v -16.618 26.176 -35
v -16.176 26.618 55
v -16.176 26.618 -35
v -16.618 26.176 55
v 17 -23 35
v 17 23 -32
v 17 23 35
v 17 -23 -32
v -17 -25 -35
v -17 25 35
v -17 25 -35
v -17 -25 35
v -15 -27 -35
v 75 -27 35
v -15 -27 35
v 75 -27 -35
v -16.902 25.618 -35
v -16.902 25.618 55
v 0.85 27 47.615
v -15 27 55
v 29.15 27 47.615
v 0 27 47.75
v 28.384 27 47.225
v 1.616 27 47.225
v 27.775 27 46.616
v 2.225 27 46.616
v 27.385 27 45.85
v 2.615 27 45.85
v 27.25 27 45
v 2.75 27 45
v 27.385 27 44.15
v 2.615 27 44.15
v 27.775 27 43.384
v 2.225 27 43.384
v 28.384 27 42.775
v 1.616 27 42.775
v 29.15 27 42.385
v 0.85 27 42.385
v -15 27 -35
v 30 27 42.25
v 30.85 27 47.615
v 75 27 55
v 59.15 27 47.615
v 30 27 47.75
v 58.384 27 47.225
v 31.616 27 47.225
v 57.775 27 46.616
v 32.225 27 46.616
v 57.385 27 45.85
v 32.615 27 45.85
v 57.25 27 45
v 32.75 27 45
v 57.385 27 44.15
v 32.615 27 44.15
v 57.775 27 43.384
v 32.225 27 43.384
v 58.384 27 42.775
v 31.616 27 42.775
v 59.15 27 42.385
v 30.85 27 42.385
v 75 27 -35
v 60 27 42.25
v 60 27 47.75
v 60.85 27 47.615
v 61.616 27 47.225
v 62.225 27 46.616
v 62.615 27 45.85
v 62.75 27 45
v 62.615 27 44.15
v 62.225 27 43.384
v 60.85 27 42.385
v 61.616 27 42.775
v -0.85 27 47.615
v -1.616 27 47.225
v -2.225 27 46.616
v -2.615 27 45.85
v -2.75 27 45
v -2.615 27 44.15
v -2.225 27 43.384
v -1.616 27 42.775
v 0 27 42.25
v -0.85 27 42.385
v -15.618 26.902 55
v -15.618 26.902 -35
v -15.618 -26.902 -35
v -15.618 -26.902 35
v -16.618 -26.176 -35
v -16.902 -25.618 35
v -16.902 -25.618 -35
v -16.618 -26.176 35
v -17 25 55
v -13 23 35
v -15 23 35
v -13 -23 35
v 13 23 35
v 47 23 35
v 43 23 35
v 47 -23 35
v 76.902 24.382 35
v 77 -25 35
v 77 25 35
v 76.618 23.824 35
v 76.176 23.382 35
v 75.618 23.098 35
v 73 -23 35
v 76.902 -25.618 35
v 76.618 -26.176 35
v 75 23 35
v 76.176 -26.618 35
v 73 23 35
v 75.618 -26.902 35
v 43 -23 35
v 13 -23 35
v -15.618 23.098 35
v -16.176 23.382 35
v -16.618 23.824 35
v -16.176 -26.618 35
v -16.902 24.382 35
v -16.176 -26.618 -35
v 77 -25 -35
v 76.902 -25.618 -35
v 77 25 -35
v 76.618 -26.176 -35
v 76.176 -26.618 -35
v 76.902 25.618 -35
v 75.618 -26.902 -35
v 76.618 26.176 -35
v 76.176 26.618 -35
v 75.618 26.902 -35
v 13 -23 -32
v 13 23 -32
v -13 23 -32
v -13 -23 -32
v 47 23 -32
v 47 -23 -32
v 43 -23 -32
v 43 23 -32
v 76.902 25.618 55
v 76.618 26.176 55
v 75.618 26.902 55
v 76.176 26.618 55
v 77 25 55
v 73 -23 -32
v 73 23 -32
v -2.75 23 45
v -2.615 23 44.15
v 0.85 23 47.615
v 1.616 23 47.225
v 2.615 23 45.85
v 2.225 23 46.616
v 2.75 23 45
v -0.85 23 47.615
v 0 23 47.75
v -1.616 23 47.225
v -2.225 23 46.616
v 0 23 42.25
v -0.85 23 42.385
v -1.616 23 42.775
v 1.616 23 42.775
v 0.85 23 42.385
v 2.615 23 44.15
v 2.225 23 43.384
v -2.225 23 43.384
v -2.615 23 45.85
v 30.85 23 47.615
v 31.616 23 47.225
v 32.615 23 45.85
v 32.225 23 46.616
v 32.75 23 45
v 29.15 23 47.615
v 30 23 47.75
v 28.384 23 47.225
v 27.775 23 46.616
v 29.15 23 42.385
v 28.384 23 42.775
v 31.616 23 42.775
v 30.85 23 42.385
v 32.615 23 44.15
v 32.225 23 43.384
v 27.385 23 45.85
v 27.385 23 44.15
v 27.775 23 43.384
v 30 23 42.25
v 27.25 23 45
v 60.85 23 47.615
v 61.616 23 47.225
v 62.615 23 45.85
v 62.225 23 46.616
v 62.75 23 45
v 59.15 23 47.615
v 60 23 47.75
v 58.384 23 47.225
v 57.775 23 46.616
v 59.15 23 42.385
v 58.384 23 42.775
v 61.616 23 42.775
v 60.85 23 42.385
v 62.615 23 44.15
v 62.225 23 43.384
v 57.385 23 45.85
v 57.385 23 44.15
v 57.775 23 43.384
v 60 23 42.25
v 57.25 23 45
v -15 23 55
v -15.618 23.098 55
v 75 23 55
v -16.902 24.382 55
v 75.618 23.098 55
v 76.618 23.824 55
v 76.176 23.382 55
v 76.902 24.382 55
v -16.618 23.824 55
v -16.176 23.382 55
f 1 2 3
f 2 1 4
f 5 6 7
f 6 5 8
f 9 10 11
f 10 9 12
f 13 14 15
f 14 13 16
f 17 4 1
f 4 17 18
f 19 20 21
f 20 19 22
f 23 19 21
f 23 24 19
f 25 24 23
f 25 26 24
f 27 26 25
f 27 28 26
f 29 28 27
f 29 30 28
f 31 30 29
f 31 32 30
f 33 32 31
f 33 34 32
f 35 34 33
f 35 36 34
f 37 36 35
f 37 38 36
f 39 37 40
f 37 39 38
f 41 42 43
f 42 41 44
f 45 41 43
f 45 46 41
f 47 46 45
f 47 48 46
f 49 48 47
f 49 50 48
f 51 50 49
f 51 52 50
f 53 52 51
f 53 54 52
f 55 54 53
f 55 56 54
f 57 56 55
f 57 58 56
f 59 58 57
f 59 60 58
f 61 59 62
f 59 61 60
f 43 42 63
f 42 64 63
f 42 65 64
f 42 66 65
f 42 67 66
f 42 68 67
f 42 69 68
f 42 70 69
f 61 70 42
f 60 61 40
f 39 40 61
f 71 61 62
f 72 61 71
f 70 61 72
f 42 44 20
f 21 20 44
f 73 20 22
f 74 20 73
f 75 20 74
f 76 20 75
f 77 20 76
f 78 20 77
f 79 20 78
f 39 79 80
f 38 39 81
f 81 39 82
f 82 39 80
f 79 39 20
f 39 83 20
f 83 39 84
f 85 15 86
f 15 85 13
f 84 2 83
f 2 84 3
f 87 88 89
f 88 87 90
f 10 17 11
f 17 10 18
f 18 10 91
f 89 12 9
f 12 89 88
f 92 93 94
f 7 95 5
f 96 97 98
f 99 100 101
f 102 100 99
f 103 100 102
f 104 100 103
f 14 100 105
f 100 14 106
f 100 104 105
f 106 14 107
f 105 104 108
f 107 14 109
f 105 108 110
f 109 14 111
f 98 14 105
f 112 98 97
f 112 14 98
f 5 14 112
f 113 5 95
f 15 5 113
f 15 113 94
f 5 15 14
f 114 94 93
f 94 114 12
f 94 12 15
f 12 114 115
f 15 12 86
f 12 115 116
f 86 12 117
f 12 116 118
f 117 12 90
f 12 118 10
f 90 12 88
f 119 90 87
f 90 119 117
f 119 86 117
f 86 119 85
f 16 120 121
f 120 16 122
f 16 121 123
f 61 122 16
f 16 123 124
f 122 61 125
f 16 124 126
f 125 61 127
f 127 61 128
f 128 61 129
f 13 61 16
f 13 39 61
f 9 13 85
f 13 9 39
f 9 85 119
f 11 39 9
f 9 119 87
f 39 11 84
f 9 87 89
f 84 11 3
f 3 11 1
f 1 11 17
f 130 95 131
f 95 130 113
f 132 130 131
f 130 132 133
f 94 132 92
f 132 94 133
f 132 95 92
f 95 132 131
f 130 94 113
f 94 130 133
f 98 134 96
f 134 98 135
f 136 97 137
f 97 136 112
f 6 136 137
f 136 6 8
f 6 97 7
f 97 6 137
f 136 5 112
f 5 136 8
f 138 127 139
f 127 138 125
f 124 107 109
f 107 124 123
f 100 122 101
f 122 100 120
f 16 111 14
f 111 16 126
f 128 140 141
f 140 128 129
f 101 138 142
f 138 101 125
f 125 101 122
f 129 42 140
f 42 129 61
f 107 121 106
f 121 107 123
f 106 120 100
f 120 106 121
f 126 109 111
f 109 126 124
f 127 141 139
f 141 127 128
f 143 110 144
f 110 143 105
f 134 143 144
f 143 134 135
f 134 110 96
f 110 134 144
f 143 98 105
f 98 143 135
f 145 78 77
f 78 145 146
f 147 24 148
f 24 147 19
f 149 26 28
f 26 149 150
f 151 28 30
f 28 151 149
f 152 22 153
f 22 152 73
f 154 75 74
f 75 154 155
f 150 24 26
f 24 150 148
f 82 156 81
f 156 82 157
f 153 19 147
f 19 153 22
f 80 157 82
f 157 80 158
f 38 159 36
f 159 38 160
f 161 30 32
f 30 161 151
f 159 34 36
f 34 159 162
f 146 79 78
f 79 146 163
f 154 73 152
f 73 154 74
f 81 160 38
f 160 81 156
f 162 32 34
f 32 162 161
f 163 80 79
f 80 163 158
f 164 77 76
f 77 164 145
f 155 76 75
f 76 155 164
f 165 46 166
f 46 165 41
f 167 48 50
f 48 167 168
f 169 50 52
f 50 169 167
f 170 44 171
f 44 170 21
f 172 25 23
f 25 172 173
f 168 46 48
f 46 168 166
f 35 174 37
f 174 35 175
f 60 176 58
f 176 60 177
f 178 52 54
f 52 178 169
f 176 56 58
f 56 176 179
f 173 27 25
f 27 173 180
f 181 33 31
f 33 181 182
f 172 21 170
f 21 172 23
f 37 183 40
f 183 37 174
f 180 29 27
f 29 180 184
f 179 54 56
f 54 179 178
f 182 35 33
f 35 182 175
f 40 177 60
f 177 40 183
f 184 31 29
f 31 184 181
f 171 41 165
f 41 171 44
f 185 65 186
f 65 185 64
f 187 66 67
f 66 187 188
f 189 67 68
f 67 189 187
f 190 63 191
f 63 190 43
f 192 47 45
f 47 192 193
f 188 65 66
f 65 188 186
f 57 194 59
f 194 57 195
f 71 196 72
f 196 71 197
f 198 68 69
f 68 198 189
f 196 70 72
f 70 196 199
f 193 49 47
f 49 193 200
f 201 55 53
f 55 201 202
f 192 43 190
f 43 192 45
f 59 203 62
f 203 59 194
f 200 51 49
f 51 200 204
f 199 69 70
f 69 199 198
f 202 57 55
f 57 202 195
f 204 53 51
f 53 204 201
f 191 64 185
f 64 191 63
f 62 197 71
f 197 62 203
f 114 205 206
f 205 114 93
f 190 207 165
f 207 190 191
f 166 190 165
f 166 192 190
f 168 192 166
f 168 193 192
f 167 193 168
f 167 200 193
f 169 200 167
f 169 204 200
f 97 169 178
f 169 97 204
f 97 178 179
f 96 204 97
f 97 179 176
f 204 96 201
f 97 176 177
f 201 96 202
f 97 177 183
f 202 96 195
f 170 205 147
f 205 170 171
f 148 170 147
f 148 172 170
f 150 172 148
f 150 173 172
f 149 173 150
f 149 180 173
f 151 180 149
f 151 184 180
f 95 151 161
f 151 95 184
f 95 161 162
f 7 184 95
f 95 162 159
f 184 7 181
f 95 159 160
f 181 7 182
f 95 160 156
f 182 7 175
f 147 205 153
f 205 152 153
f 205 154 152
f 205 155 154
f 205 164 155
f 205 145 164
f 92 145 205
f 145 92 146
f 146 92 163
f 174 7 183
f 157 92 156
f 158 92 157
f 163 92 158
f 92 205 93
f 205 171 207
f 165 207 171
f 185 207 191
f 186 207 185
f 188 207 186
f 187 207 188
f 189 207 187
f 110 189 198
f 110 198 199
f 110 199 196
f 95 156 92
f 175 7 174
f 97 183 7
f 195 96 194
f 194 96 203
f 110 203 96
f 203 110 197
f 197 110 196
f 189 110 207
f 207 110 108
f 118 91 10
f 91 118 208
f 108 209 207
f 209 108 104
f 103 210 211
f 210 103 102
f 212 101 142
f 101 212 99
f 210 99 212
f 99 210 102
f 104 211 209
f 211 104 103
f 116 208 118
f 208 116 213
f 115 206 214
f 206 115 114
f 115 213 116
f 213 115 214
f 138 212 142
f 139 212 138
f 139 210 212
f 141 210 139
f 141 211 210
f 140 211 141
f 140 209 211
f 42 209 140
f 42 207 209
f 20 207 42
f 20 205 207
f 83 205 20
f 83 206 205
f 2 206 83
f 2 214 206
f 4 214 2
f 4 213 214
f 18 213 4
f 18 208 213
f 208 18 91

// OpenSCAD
/***********************************************************************
Name ......... : parametricHangingStorageBox.scad
Description....: Parametric Hanging Storage Box
Author ....... : Garrett Melenka
Version ...... : V1.0 2016/05/21
Licence ...... : GPL
***********************************************************************/

//Thickness of Bin Dividers
dividerThickness = 2;
//Width of Each Bin
binWidth = 30;
//Height of Each Bin
binHeight = 70;
//Depth of Each Bin
binDepth = 50;
//Height of back mounting plate above bin
backHeight = 20;
//Diameter of Mounting Holes
mountHoleDiameter = 5.5;
//Radius of bin cornder
cornerRadius = dividerThickness;
//Thickness of Mounting Plate
mountingBackThickness = dividerThickness;
//Specify Number of Bins
numberOfBins = 3;

numberOfMountHoles = numberOfBins;



module hangingToolHolderBin()
{
    difference()
    {
    hull(){
    
    cube(size = [binWidth, binDepth, binHeight], center = true);
    
    
    
    translate([-binWidth*0.5,-binDepth*0.5, 0]){
    cylinder(r = cornerRadius, h = binHeight, center = true);
    }
    
    translate([binWidth*0.5,-binDepth*0.5, 0]){
    cylinder(r = cornerRadius, h = binHeight, center = true);
    }
    
    translate([binWidth*0.5,binDepth*0.5, 0]){
    cylinder(r = cornerRadius, h = binHeight, center = true);
    }
    
    translate([-binWidth*0.5,binDepth*0.5, 0]){
    cylinder(r = cornerRadius, h = binHeight, center = true);
    }
    }
    
    
    translate([0,0,dividerThickness]){    
    cube(size = [binWidth - dividerThickness*2, binDepth-dividerThickness*2, binHeight-dividerThickness], center = true);
    }
    }
    
    
}

module hangingToolHolder()
{
    
    if(numberOfBins >=1)
    {
    union()
    {
    for (i = [0:1:numberOfBins-1])
    {
        
        translate([i*binWidth, 0,0])
        {
        hangingToolHolderBin();
        }
        
        
    }
    
    difference(){
    translate([binWidth*numberOfBins*0.5-binWidth*0.5,binDepth*0.5-cornerRadius*0.5,binHeight*0.5+backHeight*0.5])
        {
    
    hull(){    
    cube(size = [binWidth*numberOfBins, mountingBackThickness, backHeight], center = true);
    translate([-binWidth*numberOfBins*0.5,mountingBackThickness*0.5, 0]){    
    cylinder(r = cornerRadius, h = backHeight, center = true);
    }
    translate([binWidth*numberOfBins*0.5,mountingBackThickness*0.5, 0]){    
    cylinder(r = cornerRadius, h = backHeight, center = true);
    }
    }    
    }
    
    for (i = [0:1:numberOfMountHoles-1])
    {
    translate([i*binWidth,binDepth*0.5, backHeight*0.5+binHeight*0.5]){
    rotate([90,0,0])
    {
    cylinder(r=mountHoleDiameter*0.5, h = mountingBackThickness+cornerRadius*2, center = true);
    }
    }
    }
    }
    }
    }
    else
    {
        echo("Zero bins not possible!");
    }
}


$fn = 20;
hangingToolHolder();
